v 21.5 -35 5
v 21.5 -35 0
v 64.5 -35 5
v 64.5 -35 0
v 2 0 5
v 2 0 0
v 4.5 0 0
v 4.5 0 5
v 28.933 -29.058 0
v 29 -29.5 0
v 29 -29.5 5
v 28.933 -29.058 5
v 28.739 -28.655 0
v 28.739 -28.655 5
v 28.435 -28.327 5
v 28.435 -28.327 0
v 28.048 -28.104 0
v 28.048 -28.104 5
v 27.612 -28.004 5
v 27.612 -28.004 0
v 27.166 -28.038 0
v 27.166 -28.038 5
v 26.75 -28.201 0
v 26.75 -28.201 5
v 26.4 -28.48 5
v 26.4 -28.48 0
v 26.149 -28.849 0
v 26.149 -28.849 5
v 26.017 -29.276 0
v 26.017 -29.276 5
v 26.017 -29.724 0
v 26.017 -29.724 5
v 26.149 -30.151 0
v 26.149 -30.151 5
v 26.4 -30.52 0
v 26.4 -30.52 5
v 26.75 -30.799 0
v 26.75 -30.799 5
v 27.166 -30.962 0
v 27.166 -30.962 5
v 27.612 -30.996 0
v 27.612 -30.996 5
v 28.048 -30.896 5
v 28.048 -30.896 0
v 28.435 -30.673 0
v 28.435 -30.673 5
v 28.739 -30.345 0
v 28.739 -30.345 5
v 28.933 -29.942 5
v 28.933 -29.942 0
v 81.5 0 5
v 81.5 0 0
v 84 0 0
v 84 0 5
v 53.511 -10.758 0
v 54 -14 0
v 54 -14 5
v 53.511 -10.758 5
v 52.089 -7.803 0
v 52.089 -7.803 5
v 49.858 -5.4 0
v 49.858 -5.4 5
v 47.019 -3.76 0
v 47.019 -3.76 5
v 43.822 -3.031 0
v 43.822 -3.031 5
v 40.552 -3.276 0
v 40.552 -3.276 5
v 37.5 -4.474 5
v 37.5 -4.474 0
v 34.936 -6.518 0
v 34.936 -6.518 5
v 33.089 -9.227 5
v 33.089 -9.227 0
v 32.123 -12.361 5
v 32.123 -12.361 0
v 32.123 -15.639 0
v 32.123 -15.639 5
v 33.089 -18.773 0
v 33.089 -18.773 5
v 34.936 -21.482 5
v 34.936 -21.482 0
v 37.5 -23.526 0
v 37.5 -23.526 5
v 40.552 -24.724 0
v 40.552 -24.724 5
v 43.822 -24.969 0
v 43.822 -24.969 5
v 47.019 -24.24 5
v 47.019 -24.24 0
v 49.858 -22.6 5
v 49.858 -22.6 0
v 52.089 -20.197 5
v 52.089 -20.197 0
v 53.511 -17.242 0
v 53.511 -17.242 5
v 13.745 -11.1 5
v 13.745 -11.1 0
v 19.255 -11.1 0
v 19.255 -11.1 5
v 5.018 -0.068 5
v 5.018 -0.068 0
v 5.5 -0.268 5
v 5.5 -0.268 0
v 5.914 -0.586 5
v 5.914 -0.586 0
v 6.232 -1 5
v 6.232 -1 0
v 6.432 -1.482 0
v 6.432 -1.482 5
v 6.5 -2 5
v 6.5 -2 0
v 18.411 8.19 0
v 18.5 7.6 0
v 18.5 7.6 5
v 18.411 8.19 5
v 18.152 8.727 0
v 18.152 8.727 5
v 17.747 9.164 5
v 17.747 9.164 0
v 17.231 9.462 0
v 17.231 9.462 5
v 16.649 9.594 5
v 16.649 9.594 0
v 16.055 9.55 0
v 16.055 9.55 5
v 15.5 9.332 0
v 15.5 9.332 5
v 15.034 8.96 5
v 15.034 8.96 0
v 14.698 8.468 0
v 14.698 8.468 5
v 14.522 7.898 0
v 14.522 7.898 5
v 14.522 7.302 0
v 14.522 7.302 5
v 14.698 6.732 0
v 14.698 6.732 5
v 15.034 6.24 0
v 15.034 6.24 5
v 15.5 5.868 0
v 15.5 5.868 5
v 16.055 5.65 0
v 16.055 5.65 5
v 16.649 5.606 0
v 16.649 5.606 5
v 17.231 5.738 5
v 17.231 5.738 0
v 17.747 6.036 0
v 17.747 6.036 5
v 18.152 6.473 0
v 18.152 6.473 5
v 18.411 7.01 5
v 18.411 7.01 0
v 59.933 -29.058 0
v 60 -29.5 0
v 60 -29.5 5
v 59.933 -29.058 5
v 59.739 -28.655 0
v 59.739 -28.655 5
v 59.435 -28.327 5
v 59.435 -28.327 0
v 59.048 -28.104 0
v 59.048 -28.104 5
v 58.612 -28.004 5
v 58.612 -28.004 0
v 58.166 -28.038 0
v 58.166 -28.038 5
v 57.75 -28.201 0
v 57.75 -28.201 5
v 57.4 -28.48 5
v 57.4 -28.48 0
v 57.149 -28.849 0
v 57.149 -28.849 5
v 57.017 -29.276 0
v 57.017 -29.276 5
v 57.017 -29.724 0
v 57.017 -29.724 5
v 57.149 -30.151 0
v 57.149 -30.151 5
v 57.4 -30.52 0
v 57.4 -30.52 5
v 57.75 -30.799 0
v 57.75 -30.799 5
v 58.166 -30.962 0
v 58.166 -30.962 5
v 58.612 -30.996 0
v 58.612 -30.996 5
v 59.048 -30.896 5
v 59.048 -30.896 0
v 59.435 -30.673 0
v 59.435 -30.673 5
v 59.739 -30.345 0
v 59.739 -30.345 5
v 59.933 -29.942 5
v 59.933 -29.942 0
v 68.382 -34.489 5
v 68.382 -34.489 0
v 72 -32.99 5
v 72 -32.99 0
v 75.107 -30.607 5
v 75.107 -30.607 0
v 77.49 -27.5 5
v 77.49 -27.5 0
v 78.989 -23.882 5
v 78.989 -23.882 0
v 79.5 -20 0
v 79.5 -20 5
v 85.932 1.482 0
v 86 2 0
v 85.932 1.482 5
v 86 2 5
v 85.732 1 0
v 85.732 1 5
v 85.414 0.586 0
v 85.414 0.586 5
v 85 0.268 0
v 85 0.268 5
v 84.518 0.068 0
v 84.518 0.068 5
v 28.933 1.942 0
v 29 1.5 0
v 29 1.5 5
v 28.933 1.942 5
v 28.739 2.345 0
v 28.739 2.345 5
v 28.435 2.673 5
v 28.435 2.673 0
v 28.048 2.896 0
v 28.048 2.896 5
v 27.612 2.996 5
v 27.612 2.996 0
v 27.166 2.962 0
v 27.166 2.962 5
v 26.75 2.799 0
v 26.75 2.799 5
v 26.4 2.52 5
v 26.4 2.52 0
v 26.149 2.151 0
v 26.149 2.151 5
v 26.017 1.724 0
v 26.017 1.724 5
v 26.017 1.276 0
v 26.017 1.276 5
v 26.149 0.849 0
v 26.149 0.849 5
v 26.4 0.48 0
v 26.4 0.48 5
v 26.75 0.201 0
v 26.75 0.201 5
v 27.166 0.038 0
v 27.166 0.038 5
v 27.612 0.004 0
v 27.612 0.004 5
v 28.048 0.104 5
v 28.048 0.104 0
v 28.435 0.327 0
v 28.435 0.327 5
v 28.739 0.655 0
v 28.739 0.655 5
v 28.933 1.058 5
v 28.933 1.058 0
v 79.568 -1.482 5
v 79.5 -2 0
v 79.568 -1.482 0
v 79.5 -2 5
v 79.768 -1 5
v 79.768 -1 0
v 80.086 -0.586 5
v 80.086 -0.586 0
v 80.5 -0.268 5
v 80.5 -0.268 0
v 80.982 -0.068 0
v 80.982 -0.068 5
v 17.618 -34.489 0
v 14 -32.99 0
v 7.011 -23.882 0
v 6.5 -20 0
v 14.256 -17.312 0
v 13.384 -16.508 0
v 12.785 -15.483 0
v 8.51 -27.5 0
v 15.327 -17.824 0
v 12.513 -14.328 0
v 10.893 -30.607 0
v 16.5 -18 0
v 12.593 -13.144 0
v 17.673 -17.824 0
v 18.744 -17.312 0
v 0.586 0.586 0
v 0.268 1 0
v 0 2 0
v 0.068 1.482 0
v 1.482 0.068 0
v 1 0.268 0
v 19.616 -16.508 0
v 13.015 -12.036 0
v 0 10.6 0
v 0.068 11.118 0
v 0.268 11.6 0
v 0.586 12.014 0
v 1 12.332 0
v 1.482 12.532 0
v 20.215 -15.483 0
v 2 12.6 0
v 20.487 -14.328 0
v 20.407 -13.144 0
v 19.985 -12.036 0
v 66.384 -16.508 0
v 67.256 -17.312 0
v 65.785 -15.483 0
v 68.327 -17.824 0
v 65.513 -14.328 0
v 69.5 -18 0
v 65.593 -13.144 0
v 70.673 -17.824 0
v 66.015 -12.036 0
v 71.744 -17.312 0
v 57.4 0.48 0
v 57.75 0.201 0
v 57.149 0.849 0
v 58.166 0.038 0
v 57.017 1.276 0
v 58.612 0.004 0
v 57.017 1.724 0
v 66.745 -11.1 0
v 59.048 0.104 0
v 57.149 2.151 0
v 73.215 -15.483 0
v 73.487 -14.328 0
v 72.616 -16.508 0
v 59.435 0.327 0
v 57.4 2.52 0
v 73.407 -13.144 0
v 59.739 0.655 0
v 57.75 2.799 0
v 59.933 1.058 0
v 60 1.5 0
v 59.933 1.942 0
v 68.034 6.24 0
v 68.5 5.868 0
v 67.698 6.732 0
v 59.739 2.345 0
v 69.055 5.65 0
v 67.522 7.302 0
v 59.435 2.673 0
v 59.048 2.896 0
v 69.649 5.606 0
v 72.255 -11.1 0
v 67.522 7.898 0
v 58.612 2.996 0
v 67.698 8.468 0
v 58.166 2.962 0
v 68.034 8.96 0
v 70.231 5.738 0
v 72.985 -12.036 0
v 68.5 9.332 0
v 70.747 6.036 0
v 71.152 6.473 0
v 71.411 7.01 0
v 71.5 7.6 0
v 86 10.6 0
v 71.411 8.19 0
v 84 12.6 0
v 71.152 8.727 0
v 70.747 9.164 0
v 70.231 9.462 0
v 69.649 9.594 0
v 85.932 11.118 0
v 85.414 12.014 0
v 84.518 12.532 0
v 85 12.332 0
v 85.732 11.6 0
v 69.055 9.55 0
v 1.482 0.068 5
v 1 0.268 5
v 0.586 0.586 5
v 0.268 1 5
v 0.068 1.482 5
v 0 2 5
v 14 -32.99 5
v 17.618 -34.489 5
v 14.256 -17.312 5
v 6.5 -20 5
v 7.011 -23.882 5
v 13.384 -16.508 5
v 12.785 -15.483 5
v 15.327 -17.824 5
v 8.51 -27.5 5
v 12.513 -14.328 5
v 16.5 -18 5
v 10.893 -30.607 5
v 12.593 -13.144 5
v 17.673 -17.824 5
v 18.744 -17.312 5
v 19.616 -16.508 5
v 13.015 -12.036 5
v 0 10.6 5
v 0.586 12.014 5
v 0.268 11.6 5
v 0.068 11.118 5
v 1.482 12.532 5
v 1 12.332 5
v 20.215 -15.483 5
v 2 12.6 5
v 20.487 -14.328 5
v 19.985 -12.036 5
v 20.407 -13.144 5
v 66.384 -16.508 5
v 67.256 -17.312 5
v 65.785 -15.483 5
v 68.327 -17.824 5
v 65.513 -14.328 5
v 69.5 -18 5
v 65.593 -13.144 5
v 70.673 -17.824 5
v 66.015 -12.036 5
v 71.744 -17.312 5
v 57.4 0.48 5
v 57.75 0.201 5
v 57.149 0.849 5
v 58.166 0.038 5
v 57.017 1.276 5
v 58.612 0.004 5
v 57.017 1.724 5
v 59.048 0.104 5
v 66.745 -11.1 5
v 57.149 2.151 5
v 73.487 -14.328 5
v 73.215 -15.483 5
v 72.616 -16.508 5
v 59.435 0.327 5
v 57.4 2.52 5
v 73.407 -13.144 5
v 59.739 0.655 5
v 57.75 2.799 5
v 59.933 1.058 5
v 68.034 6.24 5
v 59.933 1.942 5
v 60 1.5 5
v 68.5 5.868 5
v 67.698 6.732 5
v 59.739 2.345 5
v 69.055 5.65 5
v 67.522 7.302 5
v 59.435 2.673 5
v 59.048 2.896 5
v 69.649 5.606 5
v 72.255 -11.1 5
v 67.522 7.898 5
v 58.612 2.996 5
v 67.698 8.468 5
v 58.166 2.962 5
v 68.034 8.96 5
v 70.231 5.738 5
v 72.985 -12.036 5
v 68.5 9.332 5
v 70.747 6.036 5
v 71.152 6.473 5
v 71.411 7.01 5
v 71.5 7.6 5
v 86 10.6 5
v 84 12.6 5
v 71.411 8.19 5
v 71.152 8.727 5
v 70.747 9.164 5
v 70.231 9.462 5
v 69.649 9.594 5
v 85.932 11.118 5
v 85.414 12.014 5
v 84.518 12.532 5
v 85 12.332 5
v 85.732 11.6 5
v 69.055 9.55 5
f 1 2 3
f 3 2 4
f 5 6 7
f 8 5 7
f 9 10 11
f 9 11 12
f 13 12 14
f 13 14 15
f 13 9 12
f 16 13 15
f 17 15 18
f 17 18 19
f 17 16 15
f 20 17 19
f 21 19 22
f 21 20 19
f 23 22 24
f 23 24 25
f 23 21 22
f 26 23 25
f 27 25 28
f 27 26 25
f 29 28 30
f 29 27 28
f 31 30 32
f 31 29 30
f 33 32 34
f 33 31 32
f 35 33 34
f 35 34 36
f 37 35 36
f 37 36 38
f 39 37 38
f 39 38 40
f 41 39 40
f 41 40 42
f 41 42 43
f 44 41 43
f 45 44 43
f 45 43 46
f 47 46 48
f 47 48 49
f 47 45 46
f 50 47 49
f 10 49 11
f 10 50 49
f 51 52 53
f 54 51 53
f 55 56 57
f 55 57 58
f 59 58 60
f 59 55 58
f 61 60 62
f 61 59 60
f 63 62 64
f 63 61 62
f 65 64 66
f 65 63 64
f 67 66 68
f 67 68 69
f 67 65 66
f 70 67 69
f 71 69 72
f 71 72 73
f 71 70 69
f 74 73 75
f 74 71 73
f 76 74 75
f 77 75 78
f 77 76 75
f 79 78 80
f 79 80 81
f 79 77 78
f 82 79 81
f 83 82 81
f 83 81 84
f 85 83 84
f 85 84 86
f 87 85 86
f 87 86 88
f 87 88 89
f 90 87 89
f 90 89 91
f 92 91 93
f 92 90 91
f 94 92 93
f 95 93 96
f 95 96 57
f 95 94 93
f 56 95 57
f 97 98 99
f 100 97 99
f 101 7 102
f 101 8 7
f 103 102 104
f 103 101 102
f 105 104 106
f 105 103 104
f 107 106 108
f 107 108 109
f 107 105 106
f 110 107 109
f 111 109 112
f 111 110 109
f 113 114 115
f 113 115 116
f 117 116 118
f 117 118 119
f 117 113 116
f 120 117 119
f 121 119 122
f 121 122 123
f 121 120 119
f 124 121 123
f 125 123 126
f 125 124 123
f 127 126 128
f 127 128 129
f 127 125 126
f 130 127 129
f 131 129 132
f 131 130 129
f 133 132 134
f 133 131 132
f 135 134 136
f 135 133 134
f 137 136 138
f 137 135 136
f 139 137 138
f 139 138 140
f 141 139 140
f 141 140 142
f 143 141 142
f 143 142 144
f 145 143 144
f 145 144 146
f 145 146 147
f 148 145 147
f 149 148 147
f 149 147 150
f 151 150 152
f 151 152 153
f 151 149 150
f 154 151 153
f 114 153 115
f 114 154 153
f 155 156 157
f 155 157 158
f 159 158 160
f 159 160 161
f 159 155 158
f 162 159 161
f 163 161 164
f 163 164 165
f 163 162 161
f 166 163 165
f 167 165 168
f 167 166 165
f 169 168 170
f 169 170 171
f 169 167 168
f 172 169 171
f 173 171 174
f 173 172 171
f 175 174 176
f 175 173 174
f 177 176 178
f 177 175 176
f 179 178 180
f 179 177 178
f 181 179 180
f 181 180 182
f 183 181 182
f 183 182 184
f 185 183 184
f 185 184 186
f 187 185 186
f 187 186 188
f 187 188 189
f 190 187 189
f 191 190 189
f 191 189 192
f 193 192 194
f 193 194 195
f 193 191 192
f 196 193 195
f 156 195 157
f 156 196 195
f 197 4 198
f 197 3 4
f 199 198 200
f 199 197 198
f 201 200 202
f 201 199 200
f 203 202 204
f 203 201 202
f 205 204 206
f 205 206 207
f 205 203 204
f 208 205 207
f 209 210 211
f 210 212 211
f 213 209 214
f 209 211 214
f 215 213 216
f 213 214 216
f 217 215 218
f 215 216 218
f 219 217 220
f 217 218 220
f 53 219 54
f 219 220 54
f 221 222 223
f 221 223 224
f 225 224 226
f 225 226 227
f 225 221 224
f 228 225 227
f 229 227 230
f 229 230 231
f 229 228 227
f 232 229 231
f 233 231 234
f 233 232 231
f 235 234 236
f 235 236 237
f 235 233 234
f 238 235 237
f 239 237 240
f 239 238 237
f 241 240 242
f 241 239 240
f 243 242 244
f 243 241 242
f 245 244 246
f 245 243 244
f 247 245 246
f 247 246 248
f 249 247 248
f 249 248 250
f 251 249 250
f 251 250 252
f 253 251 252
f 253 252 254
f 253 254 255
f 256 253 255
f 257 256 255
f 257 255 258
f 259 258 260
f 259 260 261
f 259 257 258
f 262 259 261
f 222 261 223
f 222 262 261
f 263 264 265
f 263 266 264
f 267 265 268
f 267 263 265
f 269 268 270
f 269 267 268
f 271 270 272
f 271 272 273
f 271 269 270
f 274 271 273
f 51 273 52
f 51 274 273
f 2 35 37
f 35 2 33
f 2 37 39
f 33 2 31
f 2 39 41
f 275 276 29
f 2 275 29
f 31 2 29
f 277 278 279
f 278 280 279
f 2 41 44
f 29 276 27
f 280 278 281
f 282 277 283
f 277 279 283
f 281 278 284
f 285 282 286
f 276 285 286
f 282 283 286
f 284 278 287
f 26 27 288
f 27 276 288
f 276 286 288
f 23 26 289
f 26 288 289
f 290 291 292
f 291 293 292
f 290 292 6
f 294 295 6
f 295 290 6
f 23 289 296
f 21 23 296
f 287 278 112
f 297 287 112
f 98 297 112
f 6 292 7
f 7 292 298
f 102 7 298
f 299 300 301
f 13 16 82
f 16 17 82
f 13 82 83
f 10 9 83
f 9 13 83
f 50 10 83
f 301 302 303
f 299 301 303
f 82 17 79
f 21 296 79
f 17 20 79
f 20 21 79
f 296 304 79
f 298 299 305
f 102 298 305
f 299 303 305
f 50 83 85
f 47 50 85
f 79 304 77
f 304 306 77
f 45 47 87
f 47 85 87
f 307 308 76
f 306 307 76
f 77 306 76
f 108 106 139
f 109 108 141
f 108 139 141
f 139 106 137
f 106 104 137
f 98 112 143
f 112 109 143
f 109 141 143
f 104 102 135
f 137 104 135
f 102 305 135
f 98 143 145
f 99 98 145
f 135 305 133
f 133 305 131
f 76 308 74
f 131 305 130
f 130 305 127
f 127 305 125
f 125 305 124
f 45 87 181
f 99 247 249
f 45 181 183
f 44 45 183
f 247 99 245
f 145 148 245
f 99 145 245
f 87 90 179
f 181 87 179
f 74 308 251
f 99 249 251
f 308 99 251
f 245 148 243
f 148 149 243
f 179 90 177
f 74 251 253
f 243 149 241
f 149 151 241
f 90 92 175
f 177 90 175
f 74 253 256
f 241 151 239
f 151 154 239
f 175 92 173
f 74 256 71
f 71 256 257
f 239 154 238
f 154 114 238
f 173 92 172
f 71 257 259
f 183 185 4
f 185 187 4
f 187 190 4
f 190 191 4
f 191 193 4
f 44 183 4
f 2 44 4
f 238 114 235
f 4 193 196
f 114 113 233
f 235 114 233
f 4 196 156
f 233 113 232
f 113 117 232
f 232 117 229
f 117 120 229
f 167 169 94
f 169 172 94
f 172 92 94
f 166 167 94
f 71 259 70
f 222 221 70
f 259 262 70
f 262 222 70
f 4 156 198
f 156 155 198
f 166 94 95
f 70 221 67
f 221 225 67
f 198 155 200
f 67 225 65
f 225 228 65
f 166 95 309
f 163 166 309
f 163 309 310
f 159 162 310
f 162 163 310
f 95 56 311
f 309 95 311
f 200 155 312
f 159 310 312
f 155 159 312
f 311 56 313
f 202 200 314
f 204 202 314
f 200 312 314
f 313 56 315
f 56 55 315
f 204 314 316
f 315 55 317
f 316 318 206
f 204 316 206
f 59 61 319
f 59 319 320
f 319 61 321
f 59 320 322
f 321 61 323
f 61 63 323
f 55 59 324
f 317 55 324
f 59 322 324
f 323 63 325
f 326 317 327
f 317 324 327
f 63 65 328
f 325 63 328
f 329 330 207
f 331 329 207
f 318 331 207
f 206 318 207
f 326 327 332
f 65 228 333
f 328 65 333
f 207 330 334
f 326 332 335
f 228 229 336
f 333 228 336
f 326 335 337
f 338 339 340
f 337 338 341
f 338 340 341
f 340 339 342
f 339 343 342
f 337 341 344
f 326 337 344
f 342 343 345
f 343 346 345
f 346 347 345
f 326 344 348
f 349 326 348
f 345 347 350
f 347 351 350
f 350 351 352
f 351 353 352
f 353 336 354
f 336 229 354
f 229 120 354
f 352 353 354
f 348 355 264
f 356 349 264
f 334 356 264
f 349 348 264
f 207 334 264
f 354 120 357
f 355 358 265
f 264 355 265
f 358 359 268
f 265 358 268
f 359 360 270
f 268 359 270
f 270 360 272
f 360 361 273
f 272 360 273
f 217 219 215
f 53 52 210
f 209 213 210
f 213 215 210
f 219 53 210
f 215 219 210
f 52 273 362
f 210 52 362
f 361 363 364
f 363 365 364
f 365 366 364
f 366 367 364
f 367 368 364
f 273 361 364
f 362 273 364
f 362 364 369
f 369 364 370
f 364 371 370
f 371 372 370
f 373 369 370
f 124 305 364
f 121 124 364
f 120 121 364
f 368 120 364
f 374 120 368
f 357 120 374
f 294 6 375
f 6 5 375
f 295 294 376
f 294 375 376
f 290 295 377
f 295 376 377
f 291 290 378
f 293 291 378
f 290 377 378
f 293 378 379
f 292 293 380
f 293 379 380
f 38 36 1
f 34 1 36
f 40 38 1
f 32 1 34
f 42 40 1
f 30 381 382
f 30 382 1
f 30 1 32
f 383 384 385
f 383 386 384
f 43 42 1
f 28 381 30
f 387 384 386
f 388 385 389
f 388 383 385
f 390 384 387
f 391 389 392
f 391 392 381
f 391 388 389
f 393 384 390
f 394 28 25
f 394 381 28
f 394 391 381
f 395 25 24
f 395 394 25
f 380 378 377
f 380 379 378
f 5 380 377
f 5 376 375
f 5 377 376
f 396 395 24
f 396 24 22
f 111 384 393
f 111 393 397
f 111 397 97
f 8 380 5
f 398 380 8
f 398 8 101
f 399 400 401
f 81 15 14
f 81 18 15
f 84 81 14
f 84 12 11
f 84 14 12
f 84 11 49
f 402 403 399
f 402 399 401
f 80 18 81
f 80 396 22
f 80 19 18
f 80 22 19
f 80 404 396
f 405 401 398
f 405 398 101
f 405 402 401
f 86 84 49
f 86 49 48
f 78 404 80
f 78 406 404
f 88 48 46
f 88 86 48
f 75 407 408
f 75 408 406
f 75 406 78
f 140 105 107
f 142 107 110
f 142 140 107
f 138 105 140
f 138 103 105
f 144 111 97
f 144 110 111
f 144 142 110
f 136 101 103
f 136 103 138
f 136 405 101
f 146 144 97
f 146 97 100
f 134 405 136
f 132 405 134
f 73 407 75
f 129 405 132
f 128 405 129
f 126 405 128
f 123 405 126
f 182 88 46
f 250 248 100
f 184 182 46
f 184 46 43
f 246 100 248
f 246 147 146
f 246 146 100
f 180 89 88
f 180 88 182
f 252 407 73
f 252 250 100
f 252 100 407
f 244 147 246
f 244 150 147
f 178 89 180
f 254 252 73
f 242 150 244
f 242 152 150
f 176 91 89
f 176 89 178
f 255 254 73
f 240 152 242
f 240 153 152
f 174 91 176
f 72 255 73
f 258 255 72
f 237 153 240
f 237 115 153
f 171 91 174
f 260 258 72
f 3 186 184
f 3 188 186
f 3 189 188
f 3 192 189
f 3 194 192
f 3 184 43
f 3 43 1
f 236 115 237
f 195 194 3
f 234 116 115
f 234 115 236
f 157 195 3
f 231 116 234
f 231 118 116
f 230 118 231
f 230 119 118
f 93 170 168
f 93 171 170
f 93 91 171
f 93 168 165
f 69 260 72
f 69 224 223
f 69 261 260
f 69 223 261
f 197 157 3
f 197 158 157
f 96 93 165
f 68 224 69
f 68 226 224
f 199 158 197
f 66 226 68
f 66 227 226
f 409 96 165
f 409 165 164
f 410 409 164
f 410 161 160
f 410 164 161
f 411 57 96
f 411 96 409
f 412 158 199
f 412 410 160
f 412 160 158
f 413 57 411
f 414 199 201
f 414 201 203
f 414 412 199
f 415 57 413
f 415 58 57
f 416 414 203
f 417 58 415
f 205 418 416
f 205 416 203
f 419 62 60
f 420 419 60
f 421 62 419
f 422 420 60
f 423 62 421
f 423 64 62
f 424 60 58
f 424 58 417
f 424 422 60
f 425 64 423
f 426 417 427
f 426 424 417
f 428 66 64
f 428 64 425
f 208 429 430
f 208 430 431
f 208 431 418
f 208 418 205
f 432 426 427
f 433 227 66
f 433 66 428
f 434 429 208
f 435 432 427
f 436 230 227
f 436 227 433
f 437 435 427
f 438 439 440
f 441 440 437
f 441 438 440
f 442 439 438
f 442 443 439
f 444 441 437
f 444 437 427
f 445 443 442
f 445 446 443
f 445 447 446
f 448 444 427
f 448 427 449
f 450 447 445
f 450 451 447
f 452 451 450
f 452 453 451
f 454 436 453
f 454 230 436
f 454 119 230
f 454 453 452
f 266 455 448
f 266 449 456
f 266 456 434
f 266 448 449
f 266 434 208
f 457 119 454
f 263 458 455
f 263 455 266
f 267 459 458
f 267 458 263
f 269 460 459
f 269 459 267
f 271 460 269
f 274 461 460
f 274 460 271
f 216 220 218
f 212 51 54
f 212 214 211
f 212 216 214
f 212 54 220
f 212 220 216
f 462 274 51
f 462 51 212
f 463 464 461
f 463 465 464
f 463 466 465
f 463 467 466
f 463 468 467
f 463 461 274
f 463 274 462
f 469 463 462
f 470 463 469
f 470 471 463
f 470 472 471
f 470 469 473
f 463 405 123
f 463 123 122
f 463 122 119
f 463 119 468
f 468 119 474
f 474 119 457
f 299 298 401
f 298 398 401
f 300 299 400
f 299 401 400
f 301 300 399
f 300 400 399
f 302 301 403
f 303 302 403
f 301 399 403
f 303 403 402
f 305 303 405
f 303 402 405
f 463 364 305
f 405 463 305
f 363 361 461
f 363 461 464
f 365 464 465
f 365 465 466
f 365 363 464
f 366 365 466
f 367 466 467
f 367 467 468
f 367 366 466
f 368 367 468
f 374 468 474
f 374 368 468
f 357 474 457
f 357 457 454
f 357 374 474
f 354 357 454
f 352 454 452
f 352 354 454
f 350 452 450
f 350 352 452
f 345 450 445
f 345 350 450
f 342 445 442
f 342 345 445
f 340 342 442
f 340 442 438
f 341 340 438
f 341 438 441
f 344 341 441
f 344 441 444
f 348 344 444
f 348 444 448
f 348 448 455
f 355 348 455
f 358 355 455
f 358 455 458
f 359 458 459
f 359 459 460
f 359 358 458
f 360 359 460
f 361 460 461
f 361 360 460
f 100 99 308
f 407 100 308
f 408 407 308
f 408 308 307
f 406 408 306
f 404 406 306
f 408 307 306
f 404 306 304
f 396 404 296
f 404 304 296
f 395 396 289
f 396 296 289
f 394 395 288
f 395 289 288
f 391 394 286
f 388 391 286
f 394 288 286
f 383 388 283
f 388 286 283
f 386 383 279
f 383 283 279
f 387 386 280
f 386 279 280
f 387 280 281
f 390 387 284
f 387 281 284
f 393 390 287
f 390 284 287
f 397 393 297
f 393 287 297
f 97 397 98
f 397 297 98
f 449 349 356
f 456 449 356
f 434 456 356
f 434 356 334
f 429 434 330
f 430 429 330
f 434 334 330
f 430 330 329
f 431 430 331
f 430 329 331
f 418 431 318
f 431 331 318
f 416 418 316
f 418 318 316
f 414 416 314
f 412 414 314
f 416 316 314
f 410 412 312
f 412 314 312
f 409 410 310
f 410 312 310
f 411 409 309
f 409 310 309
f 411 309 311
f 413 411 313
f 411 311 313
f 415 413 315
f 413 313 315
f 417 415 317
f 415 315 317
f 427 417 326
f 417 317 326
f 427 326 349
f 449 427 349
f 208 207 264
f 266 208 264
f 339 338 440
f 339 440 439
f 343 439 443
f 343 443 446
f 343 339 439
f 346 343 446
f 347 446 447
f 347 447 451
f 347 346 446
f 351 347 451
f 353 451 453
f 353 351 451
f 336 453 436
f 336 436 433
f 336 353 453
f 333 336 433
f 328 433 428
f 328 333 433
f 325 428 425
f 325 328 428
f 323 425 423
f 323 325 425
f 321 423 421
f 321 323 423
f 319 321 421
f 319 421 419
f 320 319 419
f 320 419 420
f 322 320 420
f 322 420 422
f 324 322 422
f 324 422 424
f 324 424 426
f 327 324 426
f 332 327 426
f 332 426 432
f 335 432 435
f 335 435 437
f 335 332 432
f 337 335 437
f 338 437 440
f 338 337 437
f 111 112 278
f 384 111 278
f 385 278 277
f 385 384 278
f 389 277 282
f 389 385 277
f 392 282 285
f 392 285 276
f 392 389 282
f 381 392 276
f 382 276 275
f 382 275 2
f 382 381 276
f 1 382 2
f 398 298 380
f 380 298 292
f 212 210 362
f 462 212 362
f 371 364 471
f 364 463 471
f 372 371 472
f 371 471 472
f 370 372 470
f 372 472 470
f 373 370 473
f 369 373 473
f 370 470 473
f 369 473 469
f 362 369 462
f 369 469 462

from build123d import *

# Parameters (mm, degrees)
SKETCH1_R           = 2
SKETCH1_R_2         = 11
SKETCH1_R_3         = 1.5
BOSS_EXTRUDE1_DEPTH = 5
FILLET1_R           = 2
FILLET2_R           = 15


with BuildPart() as part:
    # Sketch1 → Boss-Extrude1 (new body)
    with BuildSketch(Plane.XY):
        Polygon((0, 0), (6.5, 0), (6.5, -35), (79.5, -35), (79.5, 0), (86, 0), (86, 12.6), (0, 12.6), align=None)
        with Locations((69.5, 7.6)):
            Circle(SKETCH1_R, mode=Mode.SUBTRACT)
        with Locations((16.5, 7.6)):
            Circle(SKETCH1_R, mode=Mode.SUBTRACT)
        with Locations((43, -14)):
            Circle(SKETCH1_R_2, mode=Mode.SUBTRACT)
        with Locations((27.5, -29.5)):
            Circle(SKETCH1_R_3, mode=Mode.SUBTRACT)
        with Locations((58.5, -29.5)):
            Circle(SKETCH1_R_3, mode=Mode.SUBTRACT)
        with Locations((27.5, 1.5)):
            Circle(SKETCH1_R_3, mode=Mode.SUBTRACT)
        with Locations((58.5, 1.5)):
            Circle(SKETCH1_R_3, mode=Mode.SUBTRACT)
        with BuildLine():
            Line((13.745004537, -11.1), (19.254995463, -11.1))
            ThreePointArc((19.254995463, -11.1), (16.5, -18), (13.745004537, -11.1))
        make_face(mode=Mode.SUBTRACT)
        with BuildLine():
            Line((66.745004537, -11.1), (72.254995463, -11.1))
            ThreePointArc((72.254995463, -11.1), (69.5, -18), (66.745004537, -11.1))
        make_face(mode=Mode.SUBTRACT)
    extrude(amount=BOSS_EXTRUDE1_DEPTH)

    # Fillet1
    fillet1_edges = [part.edges().sort_by_distance(p)[0] for p in [
        (0, 12.6, 2.5),
        (86, 12.6, 2.5),
        (86, 0, 2.5),
        (79.5, 0, 2.5),
        (6.5, 0, 2.5),
        (0, 0, 2.5),
    ]]
    fillet(fillet1_edges, radius=FILLET1_R)

    # Fillet2
    fillet2_edges = [part.edges().sort_by_distance(p)[0] for p in [
        (79.5, -35, 2.5),
        (6.5, -35, 2.5),
    ]]
    fillet(fillet2_edges, radius=FILLET2_R)


solid = part.part
